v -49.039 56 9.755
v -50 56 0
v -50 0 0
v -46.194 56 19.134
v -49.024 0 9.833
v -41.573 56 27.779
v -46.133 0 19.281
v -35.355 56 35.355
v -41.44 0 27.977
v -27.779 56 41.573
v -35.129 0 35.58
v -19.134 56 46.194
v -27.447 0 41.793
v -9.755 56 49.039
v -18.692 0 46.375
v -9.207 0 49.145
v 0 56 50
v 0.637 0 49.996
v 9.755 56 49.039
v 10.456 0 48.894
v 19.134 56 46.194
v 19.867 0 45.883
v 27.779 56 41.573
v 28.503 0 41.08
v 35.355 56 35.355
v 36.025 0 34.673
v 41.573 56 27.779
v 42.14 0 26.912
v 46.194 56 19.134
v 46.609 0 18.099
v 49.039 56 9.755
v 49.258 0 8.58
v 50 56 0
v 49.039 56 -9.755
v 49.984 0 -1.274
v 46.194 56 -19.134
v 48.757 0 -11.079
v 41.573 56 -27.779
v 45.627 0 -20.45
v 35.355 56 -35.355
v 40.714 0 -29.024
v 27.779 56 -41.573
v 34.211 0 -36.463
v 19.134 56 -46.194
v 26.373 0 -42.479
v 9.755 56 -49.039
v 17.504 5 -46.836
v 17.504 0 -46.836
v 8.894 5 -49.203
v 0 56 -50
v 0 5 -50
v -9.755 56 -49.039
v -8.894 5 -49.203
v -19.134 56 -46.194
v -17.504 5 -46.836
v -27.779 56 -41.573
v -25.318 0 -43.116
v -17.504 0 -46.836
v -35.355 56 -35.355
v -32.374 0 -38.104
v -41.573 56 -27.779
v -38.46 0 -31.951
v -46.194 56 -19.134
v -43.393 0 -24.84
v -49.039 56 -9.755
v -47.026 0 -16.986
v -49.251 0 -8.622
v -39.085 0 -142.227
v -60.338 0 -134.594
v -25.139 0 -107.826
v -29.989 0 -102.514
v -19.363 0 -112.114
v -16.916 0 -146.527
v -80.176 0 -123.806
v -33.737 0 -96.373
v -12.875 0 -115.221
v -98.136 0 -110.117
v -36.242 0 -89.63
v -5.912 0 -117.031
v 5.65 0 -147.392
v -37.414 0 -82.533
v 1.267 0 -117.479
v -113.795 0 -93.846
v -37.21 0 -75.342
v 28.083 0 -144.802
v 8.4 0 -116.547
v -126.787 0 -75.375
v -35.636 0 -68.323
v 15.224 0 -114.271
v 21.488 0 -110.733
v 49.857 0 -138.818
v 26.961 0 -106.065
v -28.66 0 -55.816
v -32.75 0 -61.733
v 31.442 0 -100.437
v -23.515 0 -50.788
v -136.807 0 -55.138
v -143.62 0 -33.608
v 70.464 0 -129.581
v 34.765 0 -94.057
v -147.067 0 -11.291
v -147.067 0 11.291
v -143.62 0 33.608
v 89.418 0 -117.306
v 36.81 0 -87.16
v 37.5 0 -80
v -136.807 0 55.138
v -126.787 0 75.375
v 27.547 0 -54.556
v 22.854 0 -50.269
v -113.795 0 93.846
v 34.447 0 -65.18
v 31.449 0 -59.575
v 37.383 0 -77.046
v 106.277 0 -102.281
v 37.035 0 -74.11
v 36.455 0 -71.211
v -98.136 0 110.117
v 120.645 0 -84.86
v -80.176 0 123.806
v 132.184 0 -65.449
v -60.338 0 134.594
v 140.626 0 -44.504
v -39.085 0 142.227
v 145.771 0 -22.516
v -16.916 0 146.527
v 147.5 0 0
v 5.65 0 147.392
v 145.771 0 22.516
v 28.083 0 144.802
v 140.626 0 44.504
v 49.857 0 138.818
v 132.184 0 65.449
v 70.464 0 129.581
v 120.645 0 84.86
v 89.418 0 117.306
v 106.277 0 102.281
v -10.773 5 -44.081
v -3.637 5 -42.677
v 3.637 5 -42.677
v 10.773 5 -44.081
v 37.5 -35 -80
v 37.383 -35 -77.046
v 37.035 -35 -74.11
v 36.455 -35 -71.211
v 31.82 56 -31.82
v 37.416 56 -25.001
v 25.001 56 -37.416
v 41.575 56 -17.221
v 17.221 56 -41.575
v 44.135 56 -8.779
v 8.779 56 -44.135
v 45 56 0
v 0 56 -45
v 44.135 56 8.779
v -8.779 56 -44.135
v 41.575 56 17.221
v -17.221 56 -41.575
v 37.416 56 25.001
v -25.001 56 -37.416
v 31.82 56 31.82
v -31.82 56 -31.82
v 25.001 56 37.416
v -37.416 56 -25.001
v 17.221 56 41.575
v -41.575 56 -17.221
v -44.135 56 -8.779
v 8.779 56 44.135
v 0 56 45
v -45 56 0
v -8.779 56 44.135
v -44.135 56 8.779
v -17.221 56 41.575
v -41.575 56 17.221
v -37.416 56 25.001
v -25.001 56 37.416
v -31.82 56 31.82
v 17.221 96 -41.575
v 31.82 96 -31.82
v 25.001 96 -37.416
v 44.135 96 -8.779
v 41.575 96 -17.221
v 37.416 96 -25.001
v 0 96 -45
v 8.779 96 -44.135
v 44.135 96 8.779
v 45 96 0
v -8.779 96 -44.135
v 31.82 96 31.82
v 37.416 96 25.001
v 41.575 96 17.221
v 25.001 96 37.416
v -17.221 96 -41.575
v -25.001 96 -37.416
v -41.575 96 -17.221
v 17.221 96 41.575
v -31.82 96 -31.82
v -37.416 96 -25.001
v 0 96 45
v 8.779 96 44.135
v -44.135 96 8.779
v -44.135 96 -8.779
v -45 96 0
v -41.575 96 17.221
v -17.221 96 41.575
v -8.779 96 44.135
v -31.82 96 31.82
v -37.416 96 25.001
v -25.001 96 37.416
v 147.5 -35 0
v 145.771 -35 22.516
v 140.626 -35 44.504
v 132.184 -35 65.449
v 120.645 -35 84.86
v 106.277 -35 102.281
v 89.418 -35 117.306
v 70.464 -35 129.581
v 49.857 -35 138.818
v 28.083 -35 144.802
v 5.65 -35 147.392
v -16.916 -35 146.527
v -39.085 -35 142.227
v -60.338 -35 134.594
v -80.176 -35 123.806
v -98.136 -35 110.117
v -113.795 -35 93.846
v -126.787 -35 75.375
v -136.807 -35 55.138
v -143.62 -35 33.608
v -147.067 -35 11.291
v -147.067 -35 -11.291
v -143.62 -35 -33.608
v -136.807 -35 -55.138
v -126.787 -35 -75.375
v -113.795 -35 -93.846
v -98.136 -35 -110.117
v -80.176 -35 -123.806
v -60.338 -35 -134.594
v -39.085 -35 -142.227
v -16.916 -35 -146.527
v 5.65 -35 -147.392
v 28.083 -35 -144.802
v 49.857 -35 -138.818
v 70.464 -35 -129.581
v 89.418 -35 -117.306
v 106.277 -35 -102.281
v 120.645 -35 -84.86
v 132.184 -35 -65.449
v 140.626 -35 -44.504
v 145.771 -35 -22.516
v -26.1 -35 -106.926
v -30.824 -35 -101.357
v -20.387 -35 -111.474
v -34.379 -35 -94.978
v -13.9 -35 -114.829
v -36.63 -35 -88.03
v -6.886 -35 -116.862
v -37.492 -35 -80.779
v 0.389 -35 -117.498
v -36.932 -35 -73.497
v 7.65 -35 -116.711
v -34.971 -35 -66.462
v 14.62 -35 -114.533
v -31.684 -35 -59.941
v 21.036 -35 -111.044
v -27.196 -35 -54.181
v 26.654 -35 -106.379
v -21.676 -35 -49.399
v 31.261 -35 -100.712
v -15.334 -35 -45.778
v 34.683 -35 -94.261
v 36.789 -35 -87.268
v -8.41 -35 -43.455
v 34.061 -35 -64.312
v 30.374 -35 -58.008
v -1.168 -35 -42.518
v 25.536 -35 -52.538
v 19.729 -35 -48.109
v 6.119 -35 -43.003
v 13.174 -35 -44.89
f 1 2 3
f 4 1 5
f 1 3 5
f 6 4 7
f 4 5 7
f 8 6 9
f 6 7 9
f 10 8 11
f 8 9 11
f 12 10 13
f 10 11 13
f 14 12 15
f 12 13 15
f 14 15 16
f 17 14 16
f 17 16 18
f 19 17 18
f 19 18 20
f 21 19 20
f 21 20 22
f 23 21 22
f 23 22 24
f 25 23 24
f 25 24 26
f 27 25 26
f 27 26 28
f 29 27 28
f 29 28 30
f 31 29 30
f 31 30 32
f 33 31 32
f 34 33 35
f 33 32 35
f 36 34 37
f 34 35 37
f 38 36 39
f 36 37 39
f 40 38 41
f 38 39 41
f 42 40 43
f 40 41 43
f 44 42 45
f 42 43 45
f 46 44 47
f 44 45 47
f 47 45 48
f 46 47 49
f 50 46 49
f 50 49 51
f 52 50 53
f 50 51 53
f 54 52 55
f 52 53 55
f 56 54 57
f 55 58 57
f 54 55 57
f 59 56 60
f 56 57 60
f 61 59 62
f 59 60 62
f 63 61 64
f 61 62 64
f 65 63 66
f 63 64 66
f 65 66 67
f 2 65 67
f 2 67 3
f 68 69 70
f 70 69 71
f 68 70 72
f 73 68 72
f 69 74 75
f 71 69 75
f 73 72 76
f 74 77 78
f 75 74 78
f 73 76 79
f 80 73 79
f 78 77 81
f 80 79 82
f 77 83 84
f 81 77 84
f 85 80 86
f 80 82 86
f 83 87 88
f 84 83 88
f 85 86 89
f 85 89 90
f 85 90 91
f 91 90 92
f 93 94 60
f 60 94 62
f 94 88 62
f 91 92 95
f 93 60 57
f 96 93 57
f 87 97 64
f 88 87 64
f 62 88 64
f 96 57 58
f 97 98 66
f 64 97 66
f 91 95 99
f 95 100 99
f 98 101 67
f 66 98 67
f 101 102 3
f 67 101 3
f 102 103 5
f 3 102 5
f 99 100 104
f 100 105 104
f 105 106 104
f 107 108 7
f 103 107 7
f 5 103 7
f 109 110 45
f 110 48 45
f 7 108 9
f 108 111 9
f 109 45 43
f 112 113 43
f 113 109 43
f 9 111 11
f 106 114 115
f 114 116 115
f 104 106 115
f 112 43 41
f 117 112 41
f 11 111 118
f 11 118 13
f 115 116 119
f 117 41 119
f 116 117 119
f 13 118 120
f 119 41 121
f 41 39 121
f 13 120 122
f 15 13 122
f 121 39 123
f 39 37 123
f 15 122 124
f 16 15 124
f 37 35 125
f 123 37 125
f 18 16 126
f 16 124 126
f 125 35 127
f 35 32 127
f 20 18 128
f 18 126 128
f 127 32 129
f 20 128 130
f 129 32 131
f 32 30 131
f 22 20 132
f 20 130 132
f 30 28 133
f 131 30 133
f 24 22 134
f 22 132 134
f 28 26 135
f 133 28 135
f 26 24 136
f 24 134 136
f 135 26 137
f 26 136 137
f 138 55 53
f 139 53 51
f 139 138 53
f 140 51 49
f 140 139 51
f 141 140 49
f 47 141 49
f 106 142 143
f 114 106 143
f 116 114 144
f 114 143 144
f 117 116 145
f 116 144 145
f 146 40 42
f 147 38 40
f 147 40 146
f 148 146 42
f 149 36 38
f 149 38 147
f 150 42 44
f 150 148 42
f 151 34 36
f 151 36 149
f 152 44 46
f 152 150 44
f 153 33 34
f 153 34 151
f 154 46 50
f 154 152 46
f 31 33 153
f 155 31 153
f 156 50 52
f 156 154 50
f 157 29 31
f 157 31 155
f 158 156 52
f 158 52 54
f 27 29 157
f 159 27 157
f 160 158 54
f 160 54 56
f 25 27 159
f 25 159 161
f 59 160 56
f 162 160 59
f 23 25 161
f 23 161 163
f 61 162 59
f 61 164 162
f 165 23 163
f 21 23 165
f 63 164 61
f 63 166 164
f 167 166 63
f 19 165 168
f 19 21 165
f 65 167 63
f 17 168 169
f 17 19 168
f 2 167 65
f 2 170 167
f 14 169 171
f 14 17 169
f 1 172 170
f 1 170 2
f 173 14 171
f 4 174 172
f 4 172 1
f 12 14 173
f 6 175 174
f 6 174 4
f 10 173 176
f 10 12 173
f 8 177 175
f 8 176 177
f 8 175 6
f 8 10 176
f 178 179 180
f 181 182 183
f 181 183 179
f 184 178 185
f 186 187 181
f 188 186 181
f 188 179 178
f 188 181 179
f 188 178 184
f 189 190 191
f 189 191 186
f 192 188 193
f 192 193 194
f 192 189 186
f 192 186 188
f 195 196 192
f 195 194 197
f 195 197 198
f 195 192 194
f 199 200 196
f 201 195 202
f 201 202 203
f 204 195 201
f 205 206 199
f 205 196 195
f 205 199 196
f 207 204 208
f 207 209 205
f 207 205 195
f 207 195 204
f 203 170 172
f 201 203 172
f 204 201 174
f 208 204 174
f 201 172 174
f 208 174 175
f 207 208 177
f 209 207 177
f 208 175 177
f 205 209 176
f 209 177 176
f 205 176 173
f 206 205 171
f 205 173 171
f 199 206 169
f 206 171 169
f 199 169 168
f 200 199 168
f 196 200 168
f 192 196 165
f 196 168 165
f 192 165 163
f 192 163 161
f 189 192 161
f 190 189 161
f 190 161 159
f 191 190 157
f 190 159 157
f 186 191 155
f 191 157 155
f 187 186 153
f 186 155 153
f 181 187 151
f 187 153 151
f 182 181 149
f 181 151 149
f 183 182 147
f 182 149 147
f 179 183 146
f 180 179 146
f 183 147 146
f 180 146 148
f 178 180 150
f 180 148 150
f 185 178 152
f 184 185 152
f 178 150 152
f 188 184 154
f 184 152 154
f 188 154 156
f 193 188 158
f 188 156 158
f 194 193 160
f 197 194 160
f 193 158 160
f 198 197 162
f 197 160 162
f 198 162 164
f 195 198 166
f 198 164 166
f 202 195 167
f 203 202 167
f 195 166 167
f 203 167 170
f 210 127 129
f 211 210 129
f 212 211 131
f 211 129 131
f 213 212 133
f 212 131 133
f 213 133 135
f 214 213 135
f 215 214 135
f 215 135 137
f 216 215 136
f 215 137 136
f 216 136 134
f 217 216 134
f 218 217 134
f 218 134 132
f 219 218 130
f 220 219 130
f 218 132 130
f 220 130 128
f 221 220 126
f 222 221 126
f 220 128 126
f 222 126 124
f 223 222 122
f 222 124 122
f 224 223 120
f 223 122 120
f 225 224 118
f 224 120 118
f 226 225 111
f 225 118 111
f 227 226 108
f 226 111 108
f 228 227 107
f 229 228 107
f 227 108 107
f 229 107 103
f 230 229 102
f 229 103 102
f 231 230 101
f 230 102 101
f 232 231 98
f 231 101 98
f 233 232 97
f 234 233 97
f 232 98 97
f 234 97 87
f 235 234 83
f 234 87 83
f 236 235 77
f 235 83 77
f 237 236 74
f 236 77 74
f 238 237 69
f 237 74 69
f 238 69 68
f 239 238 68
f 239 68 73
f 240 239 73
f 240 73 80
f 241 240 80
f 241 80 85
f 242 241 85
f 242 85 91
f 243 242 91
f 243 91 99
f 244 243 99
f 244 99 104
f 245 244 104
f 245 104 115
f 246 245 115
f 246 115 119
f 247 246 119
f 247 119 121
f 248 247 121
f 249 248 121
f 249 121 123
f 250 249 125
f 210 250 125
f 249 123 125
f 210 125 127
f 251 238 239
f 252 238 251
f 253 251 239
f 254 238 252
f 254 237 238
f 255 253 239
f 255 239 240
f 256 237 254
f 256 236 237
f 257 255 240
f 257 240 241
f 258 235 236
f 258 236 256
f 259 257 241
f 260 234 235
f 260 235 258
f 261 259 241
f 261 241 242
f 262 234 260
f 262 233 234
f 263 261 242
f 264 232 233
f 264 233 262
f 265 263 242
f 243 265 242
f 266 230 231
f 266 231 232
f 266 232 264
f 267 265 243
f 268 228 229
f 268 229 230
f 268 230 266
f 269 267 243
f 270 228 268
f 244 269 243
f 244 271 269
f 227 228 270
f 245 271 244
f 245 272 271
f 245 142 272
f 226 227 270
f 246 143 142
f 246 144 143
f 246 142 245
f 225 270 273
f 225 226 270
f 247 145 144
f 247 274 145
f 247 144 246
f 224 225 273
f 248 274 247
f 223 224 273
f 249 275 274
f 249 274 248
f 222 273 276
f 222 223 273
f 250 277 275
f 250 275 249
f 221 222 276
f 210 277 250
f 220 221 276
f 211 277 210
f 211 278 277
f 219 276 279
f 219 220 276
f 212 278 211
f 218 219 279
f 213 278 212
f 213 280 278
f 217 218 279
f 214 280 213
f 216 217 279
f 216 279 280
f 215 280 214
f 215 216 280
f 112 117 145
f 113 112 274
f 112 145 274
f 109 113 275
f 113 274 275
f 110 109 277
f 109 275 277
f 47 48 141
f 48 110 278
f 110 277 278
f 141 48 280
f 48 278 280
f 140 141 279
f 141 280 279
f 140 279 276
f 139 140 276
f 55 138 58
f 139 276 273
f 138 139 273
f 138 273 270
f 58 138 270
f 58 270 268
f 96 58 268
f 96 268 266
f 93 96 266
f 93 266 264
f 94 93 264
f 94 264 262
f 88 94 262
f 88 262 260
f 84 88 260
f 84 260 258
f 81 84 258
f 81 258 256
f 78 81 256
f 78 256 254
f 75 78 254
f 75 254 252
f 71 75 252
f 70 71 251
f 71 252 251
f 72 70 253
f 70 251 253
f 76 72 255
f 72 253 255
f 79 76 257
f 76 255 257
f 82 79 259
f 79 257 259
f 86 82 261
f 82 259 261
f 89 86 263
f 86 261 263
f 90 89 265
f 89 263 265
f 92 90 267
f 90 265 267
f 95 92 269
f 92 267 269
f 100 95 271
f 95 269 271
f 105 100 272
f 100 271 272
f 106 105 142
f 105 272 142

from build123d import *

# Parameters (mm, degrees)
F0_R     = 147.5
F1_DEPTH = 35
F2_R     = 50
F3_DEPTH = 56
F4_R     = 45
F5_DEPTH = 40
F7_DEPTH = 40


with BuildPart() as f1:
    # F0 (on Front) → F1 (new body)
    with BuildSketch(Plane.XZ):
        Circle(F0_R)
    extrude(amount=F1_DEPTH)

    # F2 (on face) → F3 (join)
    with BuildSketch(Plane(origin=(0, 0, 0), x_dir=(-1, 0, 0), z_dir=(0, 1, 0))):
        Circle(F2_R)
    extrude(amount=F3_DEPTH)

    # F4 (on face) → F5 (join)
    with BuildSketch(Plane(origin=(0, 56, 0), x_dir=(-1, 0, 0), z_dir=(0, 1, 0))):
        Circle(F4_R)
    extrude(amount=F5_DEPTH)

    # F6 (on face) → F7 (cut)
    with BuildSketch(Plane.XZ.offset(35)):
        with BuildLine():
            ThreePointArc((36.4554849148, -71.2109375), (0, -80), (-36.4554849148, -71.2109375))
            ThreePointArc((-36.4554849148, -71.2109375), (-4.4254556656, -117.2379556656), (37.5, -80))
            ThreePointArc((37.5, -80), (37.2379556656, -75.5745443344), (36.4554849148, -71.2109375))
        make_face()
        with BuildLine():
            ThreePointArc((36.4554849148, -71.2109375), (0, -42.5), (-36.4554849148, -71.2109375))
            ThreePointArc((-36.4554849148, -71.2109375), (0, -80), (36.4554849148, -71.2109375))
        make_face()
    extrude(amount=-F7_DEPTH, mode=Mode.SUBTRACT)


solid = f1.part
